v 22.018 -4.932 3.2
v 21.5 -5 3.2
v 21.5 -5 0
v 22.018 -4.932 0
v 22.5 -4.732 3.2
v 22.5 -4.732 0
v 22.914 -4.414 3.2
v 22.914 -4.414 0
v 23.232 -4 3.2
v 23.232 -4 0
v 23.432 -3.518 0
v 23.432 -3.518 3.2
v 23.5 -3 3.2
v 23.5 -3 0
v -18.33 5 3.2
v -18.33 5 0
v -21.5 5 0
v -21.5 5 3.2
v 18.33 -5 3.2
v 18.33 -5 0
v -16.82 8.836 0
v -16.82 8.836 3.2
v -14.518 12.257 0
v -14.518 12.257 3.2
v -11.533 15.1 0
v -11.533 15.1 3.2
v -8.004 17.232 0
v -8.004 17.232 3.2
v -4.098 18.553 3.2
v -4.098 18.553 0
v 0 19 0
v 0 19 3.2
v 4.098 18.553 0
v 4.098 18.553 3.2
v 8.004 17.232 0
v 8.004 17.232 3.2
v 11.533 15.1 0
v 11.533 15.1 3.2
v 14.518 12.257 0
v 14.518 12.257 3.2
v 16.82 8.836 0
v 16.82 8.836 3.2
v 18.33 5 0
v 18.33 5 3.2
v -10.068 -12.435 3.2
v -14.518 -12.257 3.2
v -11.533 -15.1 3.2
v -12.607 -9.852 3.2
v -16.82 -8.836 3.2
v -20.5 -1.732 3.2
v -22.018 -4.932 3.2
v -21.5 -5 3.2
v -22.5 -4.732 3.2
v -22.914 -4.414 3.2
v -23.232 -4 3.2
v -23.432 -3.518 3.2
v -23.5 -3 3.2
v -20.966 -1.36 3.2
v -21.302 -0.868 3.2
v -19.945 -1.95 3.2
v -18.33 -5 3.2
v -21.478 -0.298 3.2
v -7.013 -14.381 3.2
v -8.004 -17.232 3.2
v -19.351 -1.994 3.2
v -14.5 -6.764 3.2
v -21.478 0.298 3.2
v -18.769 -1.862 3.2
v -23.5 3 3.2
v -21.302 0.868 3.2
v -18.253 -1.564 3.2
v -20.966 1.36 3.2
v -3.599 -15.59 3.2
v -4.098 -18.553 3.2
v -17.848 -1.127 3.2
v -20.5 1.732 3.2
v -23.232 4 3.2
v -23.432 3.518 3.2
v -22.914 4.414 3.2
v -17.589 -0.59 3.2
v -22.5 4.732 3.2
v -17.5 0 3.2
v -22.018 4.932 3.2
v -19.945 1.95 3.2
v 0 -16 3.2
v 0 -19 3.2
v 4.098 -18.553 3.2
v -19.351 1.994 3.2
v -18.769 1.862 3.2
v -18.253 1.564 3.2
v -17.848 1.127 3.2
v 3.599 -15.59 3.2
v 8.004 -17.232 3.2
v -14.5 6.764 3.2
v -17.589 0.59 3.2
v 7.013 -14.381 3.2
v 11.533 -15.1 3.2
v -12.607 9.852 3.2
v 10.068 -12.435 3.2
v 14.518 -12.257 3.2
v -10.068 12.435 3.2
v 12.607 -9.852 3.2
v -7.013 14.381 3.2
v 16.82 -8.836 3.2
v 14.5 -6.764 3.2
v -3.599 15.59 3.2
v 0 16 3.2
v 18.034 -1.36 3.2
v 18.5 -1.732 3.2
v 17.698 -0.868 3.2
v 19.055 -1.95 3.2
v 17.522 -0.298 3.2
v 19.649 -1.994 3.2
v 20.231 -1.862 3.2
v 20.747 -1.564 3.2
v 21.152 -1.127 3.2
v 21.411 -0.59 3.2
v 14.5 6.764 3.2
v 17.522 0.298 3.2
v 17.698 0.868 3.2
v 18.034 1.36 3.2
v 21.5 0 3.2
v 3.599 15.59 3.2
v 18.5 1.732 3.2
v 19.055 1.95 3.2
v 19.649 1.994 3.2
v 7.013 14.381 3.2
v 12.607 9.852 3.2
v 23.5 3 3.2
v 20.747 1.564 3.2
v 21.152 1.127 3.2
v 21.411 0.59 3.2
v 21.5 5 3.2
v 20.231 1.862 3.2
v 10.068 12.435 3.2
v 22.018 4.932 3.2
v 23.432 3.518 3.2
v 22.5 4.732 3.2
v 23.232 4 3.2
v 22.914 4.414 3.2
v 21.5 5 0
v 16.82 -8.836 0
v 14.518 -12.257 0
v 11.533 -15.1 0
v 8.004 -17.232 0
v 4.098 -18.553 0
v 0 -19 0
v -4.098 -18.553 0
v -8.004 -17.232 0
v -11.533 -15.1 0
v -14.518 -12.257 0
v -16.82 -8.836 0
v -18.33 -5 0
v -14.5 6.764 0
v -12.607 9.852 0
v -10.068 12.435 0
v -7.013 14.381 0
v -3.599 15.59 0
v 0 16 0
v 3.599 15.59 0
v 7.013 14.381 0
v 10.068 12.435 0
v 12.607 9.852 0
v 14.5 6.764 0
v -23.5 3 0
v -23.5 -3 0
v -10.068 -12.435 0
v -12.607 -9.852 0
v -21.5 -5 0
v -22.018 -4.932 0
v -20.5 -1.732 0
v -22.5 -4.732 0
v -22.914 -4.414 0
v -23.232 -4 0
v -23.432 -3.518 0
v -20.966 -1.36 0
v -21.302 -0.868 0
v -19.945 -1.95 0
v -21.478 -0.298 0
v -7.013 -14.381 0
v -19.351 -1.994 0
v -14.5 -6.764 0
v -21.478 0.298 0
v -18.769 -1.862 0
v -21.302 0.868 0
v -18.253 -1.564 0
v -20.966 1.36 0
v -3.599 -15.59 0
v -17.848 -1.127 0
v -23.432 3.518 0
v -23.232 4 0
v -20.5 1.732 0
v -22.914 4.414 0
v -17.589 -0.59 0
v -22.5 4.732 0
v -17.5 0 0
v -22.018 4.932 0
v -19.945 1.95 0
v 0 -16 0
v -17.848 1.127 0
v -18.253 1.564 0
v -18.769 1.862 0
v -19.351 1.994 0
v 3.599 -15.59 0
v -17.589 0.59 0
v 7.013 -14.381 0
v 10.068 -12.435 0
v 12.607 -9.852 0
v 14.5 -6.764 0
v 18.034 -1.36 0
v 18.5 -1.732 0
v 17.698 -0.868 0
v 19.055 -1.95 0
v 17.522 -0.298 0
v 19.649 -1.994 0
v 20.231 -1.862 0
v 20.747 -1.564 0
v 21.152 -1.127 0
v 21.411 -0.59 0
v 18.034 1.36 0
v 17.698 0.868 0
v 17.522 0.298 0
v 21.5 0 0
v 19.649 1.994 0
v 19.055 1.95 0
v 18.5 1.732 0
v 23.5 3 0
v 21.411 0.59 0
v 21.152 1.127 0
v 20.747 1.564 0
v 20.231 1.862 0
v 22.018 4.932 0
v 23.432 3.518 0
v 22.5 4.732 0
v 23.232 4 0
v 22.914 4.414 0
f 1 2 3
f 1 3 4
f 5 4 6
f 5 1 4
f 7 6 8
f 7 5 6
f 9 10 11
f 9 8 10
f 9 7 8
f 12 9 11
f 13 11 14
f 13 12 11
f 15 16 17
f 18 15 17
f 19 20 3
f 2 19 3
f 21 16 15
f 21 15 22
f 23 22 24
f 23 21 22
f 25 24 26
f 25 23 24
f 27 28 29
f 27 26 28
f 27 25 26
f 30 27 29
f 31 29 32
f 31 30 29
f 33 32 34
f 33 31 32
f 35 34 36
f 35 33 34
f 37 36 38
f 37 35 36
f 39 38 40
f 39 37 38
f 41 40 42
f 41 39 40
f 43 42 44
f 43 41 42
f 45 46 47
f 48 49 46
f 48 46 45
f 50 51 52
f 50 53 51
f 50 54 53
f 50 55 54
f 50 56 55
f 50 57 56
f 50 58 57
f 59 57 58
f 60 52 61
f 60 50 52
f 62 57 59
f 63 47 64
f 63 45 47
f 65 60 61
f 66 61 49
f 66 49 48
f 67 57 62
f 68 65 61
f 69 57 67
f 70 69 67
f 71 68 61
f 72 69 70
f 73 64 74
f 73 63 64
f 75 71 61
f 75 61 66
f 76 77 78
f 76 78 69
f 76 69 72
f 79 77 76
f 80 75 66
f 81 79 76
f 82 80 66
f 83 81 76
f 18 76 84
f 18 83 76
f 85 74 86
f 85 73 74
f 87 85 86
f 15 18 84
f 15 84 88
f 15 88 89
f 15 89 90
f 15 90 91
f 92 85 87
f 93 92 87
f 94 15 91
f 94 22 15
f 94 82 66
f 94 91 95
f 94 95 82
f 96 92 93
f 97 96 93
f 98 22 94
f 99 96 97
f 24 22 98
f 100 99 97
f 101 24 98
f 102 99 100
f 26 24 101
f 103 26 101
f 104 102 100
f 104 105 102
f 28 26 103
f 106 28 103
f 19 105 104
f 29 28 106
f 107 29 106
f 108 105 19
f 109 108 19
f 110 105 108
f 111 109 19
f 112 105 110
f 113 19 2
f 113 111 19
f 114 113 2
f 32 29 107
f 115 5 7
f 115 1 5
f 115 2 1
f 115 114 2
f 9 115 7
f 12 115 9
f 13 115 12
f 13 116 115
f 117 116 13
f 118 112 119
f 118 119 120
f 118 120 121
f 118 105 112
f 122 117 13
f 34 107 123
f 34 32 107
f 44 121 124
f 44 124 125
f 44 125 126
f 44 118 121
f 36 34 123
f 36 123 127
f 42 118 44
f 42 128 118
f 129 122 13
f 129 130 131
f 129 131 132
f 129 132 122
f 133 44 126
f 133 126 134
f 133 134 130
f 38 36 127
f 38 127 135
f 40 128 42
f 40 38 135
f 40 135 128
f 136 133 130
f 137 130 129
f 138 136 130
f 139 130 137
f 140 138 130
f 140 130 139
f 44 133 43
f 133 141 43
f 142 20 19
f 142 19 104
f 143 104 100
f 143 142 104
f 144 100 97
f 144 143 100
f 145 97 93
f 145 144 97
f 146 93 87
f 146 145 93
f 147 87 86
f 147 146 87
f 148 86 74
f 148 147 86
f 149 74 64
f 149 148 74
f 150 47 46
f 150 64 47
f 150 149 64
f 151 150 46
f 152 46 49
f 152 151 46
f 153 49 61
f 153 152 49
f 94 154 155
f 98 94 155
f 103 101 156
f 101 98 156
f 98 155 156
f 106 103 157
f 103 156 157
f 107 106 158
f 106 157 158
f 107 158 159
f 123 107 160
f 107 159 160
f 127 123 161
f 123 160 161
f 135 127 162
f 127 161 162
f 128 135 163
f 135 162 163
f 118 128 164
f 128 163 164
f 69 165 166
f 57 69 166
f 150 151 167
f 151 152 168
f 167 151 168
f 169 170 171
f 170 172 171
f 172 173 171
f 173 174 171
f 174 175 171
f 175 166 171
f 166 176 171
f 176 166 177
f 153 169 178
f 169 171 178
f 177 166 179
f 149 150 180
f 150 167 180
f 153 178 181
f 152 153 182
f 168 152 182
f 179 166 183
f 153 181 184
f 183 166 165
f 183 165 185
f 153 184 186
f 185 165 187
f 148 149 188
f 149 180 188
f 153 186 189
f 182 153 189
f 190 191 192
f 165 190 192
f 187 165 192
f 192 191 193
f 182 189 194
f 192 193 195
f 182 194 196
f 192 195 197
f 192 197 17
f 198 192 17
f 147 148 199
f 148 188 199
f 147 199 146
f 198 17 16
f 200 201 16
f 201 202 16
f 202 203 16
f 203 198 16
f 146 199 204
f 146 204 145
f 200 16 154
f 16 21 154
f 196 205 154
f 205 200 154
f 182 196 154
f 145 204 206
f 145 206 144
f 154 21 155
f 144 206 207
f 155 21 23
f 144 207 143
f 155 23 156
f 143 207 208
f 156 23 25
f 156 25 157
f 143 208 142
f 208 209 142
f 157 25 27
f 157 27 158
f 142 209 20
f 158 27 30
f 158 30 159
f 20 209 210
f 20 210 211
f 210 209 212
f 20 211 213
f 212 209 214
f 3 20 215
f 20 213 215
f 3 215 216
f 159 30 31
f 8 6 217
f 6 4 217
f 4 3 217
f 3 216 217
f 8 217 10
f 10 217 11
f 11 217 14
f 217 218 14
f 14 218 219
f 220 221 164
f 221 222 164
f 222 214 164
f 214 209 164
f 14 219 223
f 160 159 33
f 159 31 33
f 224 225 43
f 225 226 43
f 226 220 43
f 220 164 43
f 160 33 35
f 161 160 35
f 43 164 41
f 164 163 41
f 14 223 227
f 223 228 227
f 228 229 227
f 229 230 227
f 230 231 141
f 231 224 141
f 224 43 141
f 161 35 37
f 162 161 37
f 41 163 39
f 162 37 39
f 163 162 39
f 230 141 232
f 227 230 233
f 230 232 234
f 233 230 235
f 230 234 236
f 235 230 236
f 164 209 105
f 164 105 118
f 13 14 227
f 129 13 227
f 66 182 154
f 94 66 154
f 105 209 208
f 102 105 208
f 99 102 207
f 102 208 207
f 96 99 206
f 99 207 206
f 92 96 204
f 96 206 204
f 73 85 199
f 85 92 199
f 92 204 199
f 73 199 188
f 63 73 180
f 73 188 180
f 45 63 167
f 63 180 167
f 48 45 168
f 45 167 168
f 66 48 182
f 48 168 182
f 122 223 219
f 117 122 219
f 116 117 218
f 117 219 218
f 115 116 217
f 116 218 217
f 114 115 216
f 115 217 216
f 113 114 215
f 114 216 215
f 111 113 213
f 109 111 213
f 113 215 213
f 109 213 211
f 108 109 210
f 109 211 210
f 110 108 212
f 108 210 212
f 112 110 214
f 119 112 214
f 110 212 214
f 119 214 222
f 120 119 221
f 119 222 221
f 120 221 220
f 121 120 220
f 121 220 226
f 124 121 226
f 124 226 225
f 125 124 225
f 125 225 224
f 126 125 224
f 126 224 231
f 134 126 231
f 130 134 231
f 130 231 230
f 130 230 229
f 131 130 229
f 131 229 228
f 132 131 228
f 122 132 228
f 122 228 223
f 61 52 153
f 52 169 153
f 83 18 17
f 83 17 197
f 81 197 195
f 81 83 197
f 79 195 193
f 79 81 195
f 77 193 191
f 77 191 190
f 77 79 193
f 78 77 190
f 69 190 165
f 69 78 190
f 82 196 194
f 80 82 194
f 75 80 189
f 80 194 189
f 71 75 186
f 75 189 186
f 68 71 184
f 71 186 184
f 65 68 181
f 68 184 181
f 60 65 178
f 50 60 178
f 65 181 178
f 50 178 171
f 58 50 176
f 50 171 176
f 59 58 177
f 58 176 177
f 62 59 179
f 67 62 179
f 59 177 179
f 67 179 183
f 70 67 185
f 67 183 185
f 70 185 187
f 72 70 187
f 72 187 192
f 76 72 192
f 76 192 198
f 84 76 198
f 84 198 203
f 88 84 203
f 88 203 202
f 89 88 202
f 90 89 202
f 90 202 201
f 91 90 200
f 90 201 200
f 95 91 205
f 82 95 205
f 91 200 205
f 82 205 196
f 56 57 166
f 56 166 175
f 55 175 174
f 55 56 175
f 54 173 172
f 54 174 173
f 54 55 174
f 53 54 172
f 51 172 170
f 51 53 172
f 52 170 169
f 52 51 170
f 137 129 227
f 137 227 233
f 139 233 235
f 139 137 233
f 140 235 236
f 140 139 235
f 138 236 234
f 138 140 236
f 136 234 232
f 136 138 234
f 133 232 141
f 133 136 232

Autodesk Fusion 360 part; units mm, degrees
sketch "Sketch1" plane through (0, 0, 0) normal (0, 0, 1) x (1, 0, 0)
  circle A0 centre (0, 0) radius 16
  line L0 (0, 0) -> (19.5, 0) construction
  circle A1 centre (19.5, 0) radius 2
  line L1 (0, 0) -> (0, 16) construction
  circle A2 centre (-19.5, 0) radius 2
  line L2 (23.5, 5) -> (-23.5, 5)
  line L3 (-23.5, 5) -> (-23.5, -5)
  line L4 (-23.5, -5) -> (23.5, -5)
  line L5 (23.5, -5) -> (23.5, 5)
  line L6 (23.5, 5) -> (-23.5, -5) construction
  line L7 (-23.5, 5) -> (23.5, -5) construction
  circle A3 centre (0, 0) radius 19
  line L8 (-14.5, 5) -> (-24.5, 5)
  line L9 (-24.5, 5) -> (-24.5, -5)
  line L10 (-24.5, -5) -> (-14.5, -5)
  line L11 (-14.5, -5) -> (-14.5, 5)
  line L12 (-14.5, 5) -> (-24.5, -5) construction
  line L13 (-24.5, 5) -> (-14.5, -5) construction
  line L14 (24.5, 5) -> (24.5, -5)
  line L15 (24.5, -5) -> (14.5, -5)
  line L16 (14.5, -5) -> (14.5, 5)
  line L17 (14.5, 5) -> (24.5, 5)
  line L18 (-14.5, -5) -> (-14.5, -6.7639)
  line L19 (-14.5, 5) -> (-14.5, 6.7639)
  line L20 (14.5, 5) -> (14.5, 6.7639)
  line L21 (14.5, -5) -> (14.5, -6.7639)
  point P0 (-19.5, 0)
  dimension "d1" = 32
  dimension "d2" = 19.5
  dimension "d3" = 4
  dimension "d4" = 3
  dimension "d5" = 4
  dimension "d6" = 10
  dimension "d11" = 5
extrude "Extrude1" add sketch "Sketch1" along normal blind 3.2 contours A0 L2 A3 L8 L17 | A0 L2 L17 L20 | A0 L2 L8 L19 | A0 A1 L2 L4 A3 L15 L17 | A0 L2 L4 L15 L16 L17 | A0 L2 L4 L8 L10 L11 | A0 A2 L2 L4 A3 L8 L10 | A1 L2 L4 L5 A3 L15 L17 | A0 L4 L15 L21 | A0 L4 L10 L18 | A0 L4 A3 L10 L15 | A2 L2 L3 L4 A3 L8 L10
fillet "Fillet1" radius 2 4 edges at (-23.5, -5, 1.6) (-23.5, 5, 1.6) (23.5, -5, 1.6) (23.5, 5, 1.6)
equation "d2 = ( 39 / 2 ) * 1 mm"
